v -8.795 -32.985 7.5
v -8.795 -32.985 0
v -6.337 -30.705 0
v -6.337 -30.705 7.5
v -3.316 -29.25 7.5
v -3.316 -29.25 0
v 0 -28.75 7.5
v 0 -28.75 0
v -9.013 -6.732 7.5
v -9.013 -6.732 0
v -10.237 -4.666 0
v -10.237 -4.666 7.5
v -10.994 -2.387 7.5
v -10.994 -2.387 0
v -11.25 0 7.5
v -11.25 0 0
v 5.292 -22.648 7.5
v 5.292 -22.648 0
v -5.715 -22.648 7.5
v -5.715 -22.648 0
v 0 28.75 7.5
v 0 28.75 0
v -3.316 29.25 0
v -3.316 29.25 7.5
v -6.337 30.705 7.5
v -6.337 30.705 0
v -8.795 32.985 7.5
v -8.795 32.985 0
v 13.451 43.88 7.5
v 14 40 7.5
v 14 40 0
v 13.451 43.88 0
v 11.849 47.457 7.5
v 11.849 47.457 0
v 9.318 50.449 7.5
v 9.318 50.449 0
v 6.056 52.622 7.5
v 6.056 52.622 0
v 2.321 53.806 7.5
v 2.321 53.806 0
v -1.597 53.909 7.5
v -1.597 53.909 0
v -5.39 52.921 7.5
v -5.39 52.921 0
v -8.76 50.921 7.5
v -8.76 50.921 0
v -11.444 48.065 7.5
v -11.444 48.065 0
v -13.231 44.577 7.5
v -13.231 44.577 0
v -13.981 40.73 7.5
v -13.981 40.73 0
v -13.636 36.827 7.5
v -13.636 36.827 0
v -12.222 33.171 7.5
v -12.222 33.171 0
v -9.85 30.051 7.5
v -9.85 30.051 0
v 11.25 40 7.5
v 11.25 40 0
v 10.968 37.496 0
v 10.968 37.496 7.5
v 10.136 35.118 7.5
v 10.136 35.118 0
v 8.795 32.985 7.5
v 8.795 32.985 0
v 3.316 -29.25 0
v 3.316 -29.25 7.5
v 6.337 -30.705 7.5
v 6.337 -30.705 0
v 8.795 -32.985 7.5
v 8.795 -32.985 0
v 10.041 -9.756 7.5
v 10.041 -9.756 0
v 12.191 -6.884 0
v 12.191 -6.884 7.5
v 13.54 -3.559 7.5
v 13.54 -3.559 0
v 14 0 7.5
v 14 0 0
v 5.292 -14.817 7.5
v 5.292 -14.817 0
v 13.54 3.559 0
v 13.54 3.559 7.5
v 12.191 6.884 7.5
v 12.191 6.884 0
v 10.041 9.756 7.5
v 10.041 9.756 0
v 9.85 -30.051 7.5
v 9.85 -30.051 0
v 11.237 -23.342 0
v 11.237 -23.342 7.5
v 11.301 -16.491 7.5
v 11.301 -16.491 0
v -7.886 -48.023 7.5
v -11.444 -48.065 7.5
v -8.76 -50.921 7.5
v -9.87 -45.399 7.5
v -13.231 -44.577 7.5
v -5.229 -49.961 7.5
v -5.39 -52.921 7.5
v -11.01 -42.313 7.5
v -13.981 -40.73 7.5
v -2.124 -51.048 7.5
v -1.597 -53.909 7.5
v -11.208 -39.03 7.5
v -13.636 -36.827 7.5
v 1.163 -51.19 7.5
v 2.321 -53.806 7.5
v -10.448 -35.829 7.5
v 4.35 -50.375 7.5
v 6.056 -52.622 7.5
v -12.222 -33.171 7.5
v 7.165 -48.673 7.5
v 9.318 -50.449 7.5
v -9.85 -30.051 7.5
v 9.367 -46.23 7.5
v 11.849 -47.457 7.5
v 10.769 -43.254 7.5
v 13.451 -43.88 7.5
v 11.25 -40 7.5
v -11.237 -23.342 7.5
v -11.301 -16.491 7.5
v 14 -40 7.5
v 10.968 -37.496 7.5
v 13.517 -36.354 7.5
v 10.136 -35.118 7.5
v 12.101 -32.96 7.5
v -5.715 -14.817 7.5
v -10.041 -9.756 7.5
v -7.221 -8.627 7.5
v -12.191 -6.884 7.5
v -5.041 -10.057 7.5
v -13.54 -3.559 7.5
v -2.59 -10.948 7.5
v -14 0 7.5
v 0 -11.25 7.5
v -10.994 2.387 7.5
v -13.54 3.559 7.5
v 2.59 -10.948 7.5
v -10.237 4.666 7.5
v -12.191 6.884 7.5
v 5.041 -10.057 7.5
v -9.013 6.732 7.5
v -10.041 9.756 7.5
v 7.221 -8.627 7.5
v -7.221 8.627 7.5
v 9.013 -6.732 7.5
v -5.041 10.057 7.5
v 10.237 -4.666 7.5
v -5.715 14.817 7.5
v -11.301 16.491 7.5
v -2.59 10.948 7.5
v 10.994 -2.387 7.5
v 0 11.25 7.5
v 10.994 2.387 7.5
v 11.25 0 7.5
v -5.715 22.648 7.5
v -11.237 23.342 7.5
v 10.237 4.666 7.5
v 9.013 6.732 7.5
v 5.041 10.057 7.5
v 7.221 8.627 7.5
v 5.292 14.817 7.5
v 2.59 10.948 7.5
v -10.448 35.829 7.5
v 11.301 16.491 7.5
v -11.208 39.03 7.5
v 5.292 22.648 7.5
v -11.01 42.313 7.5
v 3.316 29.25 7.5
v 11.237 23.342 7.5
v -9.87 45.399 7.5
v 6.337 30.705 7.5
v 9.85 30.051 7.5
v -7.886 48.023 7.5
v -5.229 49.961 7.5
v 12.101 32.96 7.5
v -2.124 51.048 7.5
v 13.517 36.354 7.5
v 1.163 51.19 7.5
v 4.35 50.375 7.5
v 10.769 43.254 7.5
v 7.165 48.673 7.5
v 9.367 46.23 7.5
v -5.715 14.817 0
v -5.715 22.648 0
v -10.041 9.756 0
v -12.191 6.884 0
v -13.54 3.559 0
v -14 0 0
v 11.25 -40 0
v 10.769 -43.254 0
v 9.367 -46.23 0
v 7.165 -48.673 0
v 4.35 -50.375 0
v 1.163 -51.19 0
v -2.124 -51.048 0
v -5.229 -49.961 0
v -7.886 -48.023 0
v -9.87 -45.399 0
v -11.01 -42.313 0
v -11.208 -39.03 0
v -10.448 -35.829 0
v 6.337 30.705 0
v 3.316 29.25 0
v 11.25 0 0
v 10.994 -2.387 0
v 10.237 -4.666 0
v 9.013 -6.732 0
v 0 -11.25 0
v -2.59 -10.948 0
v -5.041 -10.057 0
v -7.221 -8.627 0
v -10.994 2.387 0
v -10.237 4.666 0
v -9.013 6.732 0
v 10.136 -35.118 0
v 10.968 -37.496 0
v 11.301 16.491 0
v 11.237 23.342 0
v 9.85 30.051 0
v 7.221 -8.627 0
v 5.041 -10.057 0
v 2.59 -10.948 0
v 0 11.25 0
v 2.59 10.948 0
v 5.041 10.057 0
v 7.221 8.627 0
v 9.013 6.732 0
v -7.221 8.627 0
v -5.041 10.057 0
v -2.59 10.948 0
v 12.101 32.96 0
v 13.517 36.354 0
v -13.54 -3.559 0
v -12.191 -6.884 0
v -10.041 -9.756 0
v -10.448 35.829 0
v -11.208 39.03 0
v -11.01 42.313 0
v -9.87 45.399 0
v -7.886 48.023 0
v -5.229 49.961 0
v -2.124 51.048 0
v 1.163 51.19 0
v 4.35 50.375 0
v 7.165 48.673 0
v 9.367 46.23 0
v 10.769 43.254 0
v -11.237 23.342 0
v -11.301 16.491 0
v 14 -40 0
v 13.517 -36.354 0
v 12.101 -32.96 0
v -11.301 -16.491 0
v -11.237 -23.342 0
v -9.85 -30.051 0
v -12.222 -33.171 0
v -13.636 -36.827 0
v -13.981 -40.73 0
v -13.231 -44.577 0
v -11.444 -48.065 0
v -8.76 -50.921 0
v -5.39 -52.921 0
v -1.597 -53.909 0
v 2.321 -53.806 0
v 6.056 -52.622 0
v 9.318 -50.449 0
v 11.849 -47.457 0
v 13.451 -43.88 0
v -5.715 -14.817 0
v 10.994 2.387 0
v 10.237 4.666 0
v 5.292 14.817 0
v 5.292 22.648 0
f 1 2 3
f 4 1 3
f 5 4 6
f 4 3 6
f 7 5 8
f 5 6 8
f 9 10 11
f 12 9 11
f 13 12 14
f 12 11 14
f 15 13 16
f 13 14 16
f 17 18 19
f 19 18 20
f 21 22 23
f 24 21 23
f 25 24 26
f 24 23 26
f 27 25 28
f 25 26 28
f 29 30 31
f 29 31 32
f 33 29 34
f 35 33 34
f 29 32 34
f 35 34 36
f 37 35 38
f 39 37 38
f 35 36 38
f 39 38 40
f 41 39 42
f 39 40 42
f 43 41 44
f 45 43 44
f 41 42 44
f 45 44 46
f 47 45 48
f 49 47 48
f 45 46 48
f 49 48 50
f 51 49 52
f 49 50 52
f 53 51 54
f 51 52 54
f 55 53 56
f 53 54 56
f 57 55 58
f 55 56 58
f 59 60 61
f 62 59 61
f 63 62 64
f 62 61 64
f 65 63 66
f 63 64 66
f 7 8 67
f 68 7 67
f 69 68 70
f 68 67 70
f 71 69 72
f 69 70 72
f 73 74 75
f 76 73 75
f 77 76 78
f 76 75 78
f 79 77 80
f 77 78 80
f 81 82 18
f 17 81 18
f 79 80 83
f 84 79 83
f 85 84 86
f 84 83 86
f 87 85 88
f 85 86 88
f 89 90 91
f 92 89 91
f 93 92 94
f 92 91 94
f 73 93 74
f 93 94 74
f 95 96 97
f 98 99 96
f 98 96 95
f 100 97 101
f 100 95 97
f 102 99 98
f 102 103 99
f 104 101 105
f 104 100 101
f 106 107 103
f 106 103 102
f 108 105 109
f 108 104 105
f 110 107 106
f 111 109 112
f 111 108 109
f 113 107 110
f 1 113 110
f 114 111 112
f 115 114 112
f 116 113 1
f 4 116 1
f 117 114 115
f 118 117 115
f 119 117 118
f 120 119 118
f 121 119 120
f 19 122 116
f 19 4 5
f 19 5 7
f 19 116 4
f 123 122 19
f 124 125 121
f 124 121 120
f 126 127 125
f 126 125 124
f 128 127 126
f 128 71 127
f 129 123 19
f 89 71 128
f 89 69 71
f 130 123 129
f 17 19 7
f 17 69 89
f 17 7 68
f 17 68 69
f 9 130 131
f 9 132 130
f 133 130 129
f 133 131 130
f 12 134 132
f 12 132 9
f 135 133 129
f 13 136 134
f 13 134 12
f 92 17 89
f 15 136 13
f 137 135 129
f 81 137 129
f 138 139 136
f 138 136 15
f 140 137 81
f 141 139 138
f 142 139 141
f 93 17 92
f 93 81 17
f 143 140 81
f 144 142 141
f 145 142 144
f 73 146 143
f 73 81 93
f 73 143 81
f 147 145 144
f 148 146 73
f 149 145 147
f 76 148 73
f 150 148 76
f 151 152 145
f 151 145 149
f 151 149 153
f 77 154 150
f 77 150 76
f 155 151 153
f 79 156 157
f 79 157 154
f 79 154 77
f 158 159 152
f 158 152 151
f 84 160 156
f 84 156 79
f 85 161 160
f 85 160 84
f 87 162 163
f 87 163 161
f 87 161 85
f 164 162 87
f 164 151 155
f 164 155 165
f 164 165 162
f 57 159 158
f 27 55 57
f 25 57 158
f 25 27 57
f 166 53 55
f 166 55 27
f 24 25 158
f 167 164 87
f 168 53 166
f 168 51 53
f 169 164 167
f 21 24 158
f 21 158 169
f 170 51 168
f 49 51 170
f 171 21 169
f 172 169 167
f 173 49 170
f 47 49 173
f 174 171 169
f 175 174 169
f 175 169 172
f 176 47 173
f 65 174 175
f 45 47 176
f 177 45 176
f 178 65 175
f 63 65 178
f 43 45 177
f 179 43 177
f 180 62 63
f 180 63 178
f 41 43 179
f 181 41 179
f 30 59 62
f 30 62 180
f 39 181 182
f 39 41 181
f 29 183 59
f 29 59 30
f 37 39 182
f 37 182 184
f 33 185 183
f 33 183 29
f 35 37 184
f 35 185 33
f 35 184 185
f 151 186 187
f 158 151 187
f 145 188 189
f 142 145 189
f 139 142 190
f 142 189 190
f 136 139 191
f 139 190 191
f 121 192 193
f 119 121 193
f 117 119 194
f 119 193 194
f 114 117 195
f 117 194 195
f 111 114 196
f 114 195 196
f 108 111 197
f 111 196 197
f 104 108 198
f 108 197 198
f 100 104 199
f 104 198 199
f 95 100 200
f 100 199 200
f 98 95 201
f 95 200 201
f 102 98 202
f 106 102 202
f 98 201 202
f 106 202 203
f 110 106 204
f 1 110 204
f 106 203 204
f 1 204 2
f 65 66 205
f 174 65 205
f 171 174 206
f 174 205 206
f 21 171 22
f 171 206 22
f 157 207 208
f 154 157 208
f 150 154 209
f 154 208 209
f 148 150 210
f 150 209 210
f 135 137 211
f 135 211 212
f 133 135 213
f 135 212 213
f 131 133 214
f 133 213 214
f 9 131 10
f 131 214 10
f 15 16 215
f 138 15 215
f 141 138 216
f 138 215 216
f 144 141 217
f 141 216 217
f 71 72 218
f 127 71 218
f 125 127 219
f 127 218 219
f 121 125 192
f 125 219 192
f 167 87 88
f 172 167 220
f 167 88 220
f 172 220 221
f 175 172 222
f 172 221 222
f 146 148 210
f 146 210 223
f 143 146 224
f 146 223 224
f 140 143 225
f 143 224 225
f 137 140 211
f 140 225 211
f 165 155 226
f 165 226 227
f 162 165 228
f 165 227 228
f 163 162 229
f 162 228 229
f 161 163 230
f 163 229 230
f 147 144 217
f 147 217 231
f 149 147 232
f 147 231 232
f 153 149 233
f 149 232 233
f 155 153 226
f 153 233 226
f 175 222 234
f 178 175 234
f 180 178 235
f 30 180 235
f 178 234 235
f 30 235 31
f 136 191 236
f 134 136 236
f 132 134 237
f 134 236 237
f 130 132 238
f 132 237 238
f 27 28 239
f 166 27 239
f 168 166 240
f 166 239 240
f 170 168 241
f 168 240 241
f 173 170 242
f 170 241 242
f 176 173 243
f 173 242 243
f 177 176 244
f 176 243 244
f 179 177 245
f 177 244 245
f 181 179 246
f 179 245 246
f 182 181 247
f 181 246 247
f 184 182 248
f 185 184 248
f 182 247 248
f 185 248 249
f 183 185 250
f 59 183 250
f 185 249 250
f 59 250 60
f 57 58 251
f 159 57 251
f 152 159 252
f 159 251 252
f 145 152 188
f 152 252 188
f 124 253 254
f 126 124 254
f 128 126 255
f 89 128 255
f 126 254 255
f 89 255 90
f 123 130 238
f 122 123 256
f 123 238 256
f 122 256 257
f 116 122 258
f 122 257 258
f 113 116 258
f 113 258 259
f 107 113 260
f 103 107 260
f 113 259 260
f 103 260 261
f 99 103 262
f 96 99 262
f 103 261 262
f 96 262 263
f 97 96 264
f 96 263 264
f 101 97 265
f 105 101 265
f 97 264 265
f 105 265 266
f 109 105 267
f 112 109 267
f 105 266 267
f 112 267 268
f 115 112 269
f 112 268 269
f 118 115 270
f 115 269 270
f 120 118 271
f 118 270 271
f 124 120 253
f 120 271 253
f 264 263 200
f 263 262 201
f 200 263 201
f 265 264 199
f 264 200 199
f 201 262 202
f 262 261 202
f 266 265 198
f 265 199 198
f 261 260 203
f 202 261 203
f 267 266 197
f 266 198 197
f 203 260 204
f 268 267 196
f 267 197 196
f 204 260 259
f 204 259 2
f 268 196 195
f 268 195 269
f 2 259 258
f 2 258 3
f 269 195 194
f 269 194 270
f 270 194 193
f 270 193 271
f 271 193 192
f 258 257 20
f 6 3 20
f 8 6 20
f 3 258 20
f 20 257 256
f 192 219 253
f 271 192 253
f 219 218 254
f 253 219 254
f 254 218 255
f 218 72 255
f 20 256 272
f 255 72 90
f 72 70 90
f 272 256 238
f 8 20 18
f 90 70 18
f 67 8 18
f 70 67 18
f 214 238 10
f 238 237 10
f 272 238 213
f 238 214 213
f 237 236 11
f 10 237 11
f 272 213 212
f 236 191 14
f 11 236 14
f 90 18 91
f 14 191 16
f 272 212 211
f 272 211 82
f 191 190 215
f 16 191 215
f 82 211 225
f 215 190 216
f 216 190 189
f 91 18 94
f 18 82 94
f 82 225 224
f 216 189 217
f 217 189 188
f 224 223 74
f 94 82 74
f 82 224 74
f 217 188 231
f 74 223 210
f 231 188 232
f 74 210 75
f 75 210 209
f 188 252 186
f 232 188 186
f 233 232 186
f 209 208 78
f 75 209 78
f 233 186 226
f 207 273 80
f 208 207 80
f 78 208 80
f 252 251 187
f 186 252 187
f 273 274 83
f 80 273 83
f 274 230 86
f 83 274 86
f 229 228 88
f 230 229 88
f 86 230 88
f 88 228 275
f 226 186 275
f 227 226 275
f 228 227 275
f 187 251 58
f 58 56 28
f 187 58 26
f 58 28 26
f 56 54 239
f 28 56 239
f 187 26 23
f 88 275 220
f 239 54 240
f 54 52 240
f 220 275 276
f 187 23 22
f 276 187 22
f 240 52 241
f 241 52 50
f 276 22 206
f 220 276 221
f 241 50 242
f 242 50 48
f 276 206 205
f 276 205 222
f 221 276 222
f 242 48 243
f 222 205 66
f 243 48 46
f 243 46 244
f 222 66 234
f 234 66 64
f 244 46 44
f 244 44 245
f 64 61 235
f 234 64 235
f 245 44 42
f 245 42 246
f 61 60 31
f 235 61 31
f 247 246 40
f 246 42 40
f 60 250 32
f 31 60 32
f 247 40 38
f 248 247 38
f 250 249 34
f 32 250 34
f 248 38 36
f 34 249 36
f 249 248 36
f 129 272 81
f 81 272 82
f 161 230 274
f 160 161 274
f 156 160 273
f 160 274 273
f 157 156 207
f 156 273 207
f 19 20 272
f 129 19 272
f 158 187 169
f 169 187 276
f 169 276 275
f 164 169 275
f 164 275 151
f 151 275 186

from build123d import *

# Parameters (mm, degrees)
F1_DEPTH = 7.5


with BuildPart() as f1:
    # F0 (on Top) → F1 (new body)
    with BuildSketch(Plane.XY):
        with BuildLine():
            ThreePointArc((8.7951269587, 32.985141357), (9.3550716579, 31.5299513828), (9.8501945992, 30.0514490323))
            ThreePointArc((9.8501945992, 30.0514490323), (12.9209659931, 34.6103211779), (14, 40))
            ThreePointArc((14, 40), (-5.3896788221, 52.9209659931), (-9.8501945992, 30.0514490323))
            ThreePointArc((-9.8501945992, 30.0514490323), (-9.3550716579, 31.5299513828), (-8.7951269587, 32.985141357))
            ThreePointArc((-8.7951269587, 32.985141357), (-3.7160006536, 50.6185610674), (11.25, 40))
            ThreePointArc((11.25, 40), (10.6185610674, 36.2839993464), (8.7951269587, 32.985141357))
        make_face()
        with BuildLine():
            ThreePointArc((0, 26), (5.3254242297, 27.0524188833), (9.8501945992, 30.0514490323))
            ThreePointArc((9.8501945992, 30.0514490323), (9.3550716579, 31.5299513828), (8.7951269587, 32.985141357))
            ThreePointArc((8.7951269587, 32.985141357), (4.8808472762, 29.8639342017), (0, 28.75))
            Line((0, 28.75), (0, 26))
        make_face()
        with BuildLine():
            ThreePointArc((-9.8501945992, 30.0514490323), (-5.3254242297, 27.0524188833), (0, 26))
            Line((0, 26), (0, 28.75))
            ThreePointArc((0, 28.75), (-4.8808472762, 29.8639342017), (-8.7951269587, 32.985141357))
            ThreePointArc((-8.7951269587, 32.985141357), (-9.3550716579, 31.5299513828), (-9.8501945992, 30.0514490323))
        make_face()
        with BuildLine():
            ThreePointArc((0, 14), (5.4503386544, 12.8954956691), (10.040688359, 9.7562583646))
            ThreePointArc((10.040688359, 9.7562583646), (11.4358727735, 19.9178431142), (9.8501945992, 30.0514490323))
            ThreePointArc((9.8501945992, 30.0514490323), (5.3254242297, 27.0524188833), (0, 26))
            Line((0, 26), (0, 22.6483326405))
            Line((0, 22.6483326405), (5.2916659042, 22.6483326405))
            Line((5.2916659042, 22.6483326405), (5.2916659042, 14.8166660219))
            Line((5.2916659042, 14.8166660219), (0, 14.8166660219))
            Line((0, 14.8166660219), (0, 14))
        make_face()
        with BuildLine():
            ThreePointArc((-10.040688359, 9.7562583646), (-5.4503386544, 12.8954956691), (0, 14))
            Line((0, 14), (0, 14.8166660219))
            Line((0, 14.8166660219), (-5.7150004432, 14.8166660219))
            Line((-5.7150004432, 14.8166660219), (-5.7150004432, 22.6483326405))
            Line((-5.7150004432, 22.6483326405), (0, 22.6483326405))
            Line((0, 22.6483326405), (0, 26))
            ThreePointArc((0, 26), (-5.3254242297, 27.0524188833), (-9.8501945992, 30.0514490323))
            ThreePointArc((-9.8501945992, 30.0514490323), (-11.4358727735, 19.9178431142), (-10.040688359, 9.7562583646))
        make_face()
        with BuildLine():
            ThreePointArc((0, 11.25), (5.0410157742, 10.0573684413), (9.013218304, 6.7323395492))
            ThreePointArc((9.0132183039, 6.7323395492), (9.5611769089, 8.2326704367), (10.040688359, 9.7562583646))
            ThreePointArc((10.040688359, 9.7562583646), (5.4503386544, 12.8954956691), (0, 14))
            Line((0, 14), (0, 11.25))
        make_face()
        with BuildLine():
            ThreePointArc((9.013218304, 6.7323395492), (10.6761698638, 3.5470969877), (11.25, 0))
            Line((11.25, 0), (14, 0))
            ThreePointArc((14, 0), (12.9724638567, 5.2645210121), (10.040688359, 9.7562583646))
            ThreePointArc((10.040688359, 9.7562583646), (9.5611769089, 8.2326704367), (9.0132183039, 6.7323395492))
        make_face()
        with BuildLine():
            ThreePointArc((-9.013218304, 6.7323395492), (-5.0410157742, 10.0573684413), (0, 11.25))
            Line((0, 11.25), (0, 14))
            ThreePointArc((0, 14), (-5.4503386544, 12.8954956691), (-10.040688359, 9.7562583646))
            ThreePointArc((-10.040688359, 9.7562583646), (-9.5611769089, 8.2326704367), (-9.0132183039, 6.7323395492))
        make_face()
        with BuildLine():
            ThreePointArc((-11.25, 0), (-10.6761698638, 3.5470969877), (-9.013218304, 6.7323395492))
            ThreePointArc((-9.0132183039, 6.7323395492), (-9.5611769089, 8.2326704367), (-10.040688359, 9.7562583646))
            ThreePointArc((-10.040688359, 9.7562583646), (-12.9724638567, 5.2645210121), (-14, 0))
            Line((-14, 0), (-11.25, 0))
        make_face()
        with BuildLine():
            ThreePointArc((-10.040688359, -9.7562583646), (-9.5611769089, -8.2326704367), (-9.0132183039, -6.7323395492))
            ThreePointArc((-9.013218304, -6.7323395492), (-10.6761698638, -3.5470969877), (-11.25, 0))
            Line((-11.25, 0), (-14, 0))
            ThreePointArc((-14, 0), (-12.9724638567, -5.2645210121), (-10.040688359, -9.7562583646))
        make_face()
        with BuildLine():
            Line((14, 0), (11.25, 0))
            ThreePointArc((11.25, 0), (10.6761698638, -3.5470969877), (9.013218304, -6.7323395492))
            ThreePointArc((9.0132183039, -6.7323395492), (9.5611769089, -8.2326704367), (10.040688359, -9.7562583646))
            ThreePointArc((10.040688359, -9.7562583646), (12.9724638567, -5.2645210121), (14, 0))
        make_face()
        with BuildLine():
            ThreePointArc((10.040688359, -9.7562583646), (9.5611769089, -8.2326704367), (9.0132183039, -6.7323395492))
            ThreePointArc((9.013218304, -6.7323395492), (5.0410157742, -10.0573684413), (0, -11.25))
            Line((0, -11.25), (0, -14))
            ThreePointArc((0, -14), (5.4503386544, -12.8954956691), (10.040688359, -9.7562583646))
        make_face()
        with BuildLine():
            Line((0, -14), (0, -11.25))
            ThreePointArc((0, -11.25), (-5.0410157742, -10.0573684413), (-9.013218304, -6.7323395492))
            ThreePointArc((-9.0132183039, -6.7323395492), (-9.5611769089, -8.2326704367), (-10.040688359, -9.7562583646))
            ThreePointArc((-10.040688359, -9.7562583646), (-5.4503386544, -12.8954956691), (0, -14))
        make_face()
        with BuildLine():
            Line((0, -14.8166660219), (0, -14))
            ThreePointArc((0, -14), (-5.4503386544, -12.8954956691), (-10.040688359, -9.7562583646))
            ThreePointArc((-10.040688359, -9.7562583646), (-11.4358727735, -19.9178431142), (-9.8501945992, -30.0514490323))
            ThreePointArc((-9.8501945992, -30.0514490323), (-5.3254242297, -27.0524188833), (0, -26))
            Line((0, -26), (0, -22.6483326405))
            Line((0, -22.6483326405), (-5.7150004432, -22.6483326405))
            Line((-5.7150004432, -22.6483326405), (-5.7150004432, -14.8166660219))
            Line((-5.7150004432, -14.8166660219), (0, -14.8166660219))
        make_face()
        with BuildLine():
            ThreePointArc((9.8501945992, -30.0514490323), (11.4358727735, -19.9178431142), (10.040688359, -9.7562583646))
            ThreePointArc((10.040688359, -9.7562583646), (5.4503386544, -12.8954956691), (0, -14))
            Line((0, -14), (0, -14.8166660219))
            Line((0, -14.8166660219), (5.2916659042, -14.8166660219))
            Line((5.2916659042, -14.8166660219), (5.2916659042, -22.6483326405))
            Line((5.2916659042, -22.6483326405), (0, -22.6483326405))
            Line((0, -22.6483326405), (0, -26))
            ThreePointArc((0, -26), (5.3254242297, -27.0524188833), (9.8501945992, -30.0514490323))
        make_face()
        with BuildLine():
            ThreePointArc((14, -40), (12.9209659931, -34.6103211779), (9.8501945992, -30.0514490323))
            ThreePointArc((9.8501945992, -30.0514490323), (9.3550716579, -31.5299513828), (8.7951269587, -32.985141357))
            ThreePointArc((8.7951269587, -32.985141357), (10.6185610674, -36.2839993464), (11.25, -40))
            ThreePointArc((11.25, -40), (-3.7160006536, -50.6185610674), (-8.7951269587, -32.985141357))
            ThreePointArc((-8.7951269587, -32.985141357), (-9.3550716579, -31.5299513828), (-9.8501945992, -30.0514490323))
            ThreePointArc((-9.8501945992, -30.0514490323), (-5.3896788221, -52.9209659931), (14, -40))
        make_face()
        with BuildLine():
            Line((0, -28.75), (0, -26))
            ThreePointArc((0, -26), (-5.3254242297, -27.0524188833), (-9.8501945992, -30.0514490323))
            ThreePointArc((-9.8501945992, -30.0514490323), (-9.3550716579, -31.5299513828), (-8.7951269587, -32.985141357))
            ThreePointArc((-8.7951269587, -32.985141357), (-4.8808472762, -29.8639342017), (0, -28.75))
        make_face()
        with BuildLine():
            ThreePointArc((8.7951269587, -32.985141357), (9.3550716579, -31.5299513828), (9.8501945992, -30.0514490323))
            ThreePointArc((9.8501945992, -30.0514490323), (5.3254242297, -27.0524188833), (0, -26))
            Line((0, -26), (0, -28.75))
            ThreePointArc((0, -28.75), (4.8808472762, -29.8639342017), (8.7951269587, -32.985141357))
        make_face()
    extrude(amount=F1_DEPTH)


solid = f1.part
